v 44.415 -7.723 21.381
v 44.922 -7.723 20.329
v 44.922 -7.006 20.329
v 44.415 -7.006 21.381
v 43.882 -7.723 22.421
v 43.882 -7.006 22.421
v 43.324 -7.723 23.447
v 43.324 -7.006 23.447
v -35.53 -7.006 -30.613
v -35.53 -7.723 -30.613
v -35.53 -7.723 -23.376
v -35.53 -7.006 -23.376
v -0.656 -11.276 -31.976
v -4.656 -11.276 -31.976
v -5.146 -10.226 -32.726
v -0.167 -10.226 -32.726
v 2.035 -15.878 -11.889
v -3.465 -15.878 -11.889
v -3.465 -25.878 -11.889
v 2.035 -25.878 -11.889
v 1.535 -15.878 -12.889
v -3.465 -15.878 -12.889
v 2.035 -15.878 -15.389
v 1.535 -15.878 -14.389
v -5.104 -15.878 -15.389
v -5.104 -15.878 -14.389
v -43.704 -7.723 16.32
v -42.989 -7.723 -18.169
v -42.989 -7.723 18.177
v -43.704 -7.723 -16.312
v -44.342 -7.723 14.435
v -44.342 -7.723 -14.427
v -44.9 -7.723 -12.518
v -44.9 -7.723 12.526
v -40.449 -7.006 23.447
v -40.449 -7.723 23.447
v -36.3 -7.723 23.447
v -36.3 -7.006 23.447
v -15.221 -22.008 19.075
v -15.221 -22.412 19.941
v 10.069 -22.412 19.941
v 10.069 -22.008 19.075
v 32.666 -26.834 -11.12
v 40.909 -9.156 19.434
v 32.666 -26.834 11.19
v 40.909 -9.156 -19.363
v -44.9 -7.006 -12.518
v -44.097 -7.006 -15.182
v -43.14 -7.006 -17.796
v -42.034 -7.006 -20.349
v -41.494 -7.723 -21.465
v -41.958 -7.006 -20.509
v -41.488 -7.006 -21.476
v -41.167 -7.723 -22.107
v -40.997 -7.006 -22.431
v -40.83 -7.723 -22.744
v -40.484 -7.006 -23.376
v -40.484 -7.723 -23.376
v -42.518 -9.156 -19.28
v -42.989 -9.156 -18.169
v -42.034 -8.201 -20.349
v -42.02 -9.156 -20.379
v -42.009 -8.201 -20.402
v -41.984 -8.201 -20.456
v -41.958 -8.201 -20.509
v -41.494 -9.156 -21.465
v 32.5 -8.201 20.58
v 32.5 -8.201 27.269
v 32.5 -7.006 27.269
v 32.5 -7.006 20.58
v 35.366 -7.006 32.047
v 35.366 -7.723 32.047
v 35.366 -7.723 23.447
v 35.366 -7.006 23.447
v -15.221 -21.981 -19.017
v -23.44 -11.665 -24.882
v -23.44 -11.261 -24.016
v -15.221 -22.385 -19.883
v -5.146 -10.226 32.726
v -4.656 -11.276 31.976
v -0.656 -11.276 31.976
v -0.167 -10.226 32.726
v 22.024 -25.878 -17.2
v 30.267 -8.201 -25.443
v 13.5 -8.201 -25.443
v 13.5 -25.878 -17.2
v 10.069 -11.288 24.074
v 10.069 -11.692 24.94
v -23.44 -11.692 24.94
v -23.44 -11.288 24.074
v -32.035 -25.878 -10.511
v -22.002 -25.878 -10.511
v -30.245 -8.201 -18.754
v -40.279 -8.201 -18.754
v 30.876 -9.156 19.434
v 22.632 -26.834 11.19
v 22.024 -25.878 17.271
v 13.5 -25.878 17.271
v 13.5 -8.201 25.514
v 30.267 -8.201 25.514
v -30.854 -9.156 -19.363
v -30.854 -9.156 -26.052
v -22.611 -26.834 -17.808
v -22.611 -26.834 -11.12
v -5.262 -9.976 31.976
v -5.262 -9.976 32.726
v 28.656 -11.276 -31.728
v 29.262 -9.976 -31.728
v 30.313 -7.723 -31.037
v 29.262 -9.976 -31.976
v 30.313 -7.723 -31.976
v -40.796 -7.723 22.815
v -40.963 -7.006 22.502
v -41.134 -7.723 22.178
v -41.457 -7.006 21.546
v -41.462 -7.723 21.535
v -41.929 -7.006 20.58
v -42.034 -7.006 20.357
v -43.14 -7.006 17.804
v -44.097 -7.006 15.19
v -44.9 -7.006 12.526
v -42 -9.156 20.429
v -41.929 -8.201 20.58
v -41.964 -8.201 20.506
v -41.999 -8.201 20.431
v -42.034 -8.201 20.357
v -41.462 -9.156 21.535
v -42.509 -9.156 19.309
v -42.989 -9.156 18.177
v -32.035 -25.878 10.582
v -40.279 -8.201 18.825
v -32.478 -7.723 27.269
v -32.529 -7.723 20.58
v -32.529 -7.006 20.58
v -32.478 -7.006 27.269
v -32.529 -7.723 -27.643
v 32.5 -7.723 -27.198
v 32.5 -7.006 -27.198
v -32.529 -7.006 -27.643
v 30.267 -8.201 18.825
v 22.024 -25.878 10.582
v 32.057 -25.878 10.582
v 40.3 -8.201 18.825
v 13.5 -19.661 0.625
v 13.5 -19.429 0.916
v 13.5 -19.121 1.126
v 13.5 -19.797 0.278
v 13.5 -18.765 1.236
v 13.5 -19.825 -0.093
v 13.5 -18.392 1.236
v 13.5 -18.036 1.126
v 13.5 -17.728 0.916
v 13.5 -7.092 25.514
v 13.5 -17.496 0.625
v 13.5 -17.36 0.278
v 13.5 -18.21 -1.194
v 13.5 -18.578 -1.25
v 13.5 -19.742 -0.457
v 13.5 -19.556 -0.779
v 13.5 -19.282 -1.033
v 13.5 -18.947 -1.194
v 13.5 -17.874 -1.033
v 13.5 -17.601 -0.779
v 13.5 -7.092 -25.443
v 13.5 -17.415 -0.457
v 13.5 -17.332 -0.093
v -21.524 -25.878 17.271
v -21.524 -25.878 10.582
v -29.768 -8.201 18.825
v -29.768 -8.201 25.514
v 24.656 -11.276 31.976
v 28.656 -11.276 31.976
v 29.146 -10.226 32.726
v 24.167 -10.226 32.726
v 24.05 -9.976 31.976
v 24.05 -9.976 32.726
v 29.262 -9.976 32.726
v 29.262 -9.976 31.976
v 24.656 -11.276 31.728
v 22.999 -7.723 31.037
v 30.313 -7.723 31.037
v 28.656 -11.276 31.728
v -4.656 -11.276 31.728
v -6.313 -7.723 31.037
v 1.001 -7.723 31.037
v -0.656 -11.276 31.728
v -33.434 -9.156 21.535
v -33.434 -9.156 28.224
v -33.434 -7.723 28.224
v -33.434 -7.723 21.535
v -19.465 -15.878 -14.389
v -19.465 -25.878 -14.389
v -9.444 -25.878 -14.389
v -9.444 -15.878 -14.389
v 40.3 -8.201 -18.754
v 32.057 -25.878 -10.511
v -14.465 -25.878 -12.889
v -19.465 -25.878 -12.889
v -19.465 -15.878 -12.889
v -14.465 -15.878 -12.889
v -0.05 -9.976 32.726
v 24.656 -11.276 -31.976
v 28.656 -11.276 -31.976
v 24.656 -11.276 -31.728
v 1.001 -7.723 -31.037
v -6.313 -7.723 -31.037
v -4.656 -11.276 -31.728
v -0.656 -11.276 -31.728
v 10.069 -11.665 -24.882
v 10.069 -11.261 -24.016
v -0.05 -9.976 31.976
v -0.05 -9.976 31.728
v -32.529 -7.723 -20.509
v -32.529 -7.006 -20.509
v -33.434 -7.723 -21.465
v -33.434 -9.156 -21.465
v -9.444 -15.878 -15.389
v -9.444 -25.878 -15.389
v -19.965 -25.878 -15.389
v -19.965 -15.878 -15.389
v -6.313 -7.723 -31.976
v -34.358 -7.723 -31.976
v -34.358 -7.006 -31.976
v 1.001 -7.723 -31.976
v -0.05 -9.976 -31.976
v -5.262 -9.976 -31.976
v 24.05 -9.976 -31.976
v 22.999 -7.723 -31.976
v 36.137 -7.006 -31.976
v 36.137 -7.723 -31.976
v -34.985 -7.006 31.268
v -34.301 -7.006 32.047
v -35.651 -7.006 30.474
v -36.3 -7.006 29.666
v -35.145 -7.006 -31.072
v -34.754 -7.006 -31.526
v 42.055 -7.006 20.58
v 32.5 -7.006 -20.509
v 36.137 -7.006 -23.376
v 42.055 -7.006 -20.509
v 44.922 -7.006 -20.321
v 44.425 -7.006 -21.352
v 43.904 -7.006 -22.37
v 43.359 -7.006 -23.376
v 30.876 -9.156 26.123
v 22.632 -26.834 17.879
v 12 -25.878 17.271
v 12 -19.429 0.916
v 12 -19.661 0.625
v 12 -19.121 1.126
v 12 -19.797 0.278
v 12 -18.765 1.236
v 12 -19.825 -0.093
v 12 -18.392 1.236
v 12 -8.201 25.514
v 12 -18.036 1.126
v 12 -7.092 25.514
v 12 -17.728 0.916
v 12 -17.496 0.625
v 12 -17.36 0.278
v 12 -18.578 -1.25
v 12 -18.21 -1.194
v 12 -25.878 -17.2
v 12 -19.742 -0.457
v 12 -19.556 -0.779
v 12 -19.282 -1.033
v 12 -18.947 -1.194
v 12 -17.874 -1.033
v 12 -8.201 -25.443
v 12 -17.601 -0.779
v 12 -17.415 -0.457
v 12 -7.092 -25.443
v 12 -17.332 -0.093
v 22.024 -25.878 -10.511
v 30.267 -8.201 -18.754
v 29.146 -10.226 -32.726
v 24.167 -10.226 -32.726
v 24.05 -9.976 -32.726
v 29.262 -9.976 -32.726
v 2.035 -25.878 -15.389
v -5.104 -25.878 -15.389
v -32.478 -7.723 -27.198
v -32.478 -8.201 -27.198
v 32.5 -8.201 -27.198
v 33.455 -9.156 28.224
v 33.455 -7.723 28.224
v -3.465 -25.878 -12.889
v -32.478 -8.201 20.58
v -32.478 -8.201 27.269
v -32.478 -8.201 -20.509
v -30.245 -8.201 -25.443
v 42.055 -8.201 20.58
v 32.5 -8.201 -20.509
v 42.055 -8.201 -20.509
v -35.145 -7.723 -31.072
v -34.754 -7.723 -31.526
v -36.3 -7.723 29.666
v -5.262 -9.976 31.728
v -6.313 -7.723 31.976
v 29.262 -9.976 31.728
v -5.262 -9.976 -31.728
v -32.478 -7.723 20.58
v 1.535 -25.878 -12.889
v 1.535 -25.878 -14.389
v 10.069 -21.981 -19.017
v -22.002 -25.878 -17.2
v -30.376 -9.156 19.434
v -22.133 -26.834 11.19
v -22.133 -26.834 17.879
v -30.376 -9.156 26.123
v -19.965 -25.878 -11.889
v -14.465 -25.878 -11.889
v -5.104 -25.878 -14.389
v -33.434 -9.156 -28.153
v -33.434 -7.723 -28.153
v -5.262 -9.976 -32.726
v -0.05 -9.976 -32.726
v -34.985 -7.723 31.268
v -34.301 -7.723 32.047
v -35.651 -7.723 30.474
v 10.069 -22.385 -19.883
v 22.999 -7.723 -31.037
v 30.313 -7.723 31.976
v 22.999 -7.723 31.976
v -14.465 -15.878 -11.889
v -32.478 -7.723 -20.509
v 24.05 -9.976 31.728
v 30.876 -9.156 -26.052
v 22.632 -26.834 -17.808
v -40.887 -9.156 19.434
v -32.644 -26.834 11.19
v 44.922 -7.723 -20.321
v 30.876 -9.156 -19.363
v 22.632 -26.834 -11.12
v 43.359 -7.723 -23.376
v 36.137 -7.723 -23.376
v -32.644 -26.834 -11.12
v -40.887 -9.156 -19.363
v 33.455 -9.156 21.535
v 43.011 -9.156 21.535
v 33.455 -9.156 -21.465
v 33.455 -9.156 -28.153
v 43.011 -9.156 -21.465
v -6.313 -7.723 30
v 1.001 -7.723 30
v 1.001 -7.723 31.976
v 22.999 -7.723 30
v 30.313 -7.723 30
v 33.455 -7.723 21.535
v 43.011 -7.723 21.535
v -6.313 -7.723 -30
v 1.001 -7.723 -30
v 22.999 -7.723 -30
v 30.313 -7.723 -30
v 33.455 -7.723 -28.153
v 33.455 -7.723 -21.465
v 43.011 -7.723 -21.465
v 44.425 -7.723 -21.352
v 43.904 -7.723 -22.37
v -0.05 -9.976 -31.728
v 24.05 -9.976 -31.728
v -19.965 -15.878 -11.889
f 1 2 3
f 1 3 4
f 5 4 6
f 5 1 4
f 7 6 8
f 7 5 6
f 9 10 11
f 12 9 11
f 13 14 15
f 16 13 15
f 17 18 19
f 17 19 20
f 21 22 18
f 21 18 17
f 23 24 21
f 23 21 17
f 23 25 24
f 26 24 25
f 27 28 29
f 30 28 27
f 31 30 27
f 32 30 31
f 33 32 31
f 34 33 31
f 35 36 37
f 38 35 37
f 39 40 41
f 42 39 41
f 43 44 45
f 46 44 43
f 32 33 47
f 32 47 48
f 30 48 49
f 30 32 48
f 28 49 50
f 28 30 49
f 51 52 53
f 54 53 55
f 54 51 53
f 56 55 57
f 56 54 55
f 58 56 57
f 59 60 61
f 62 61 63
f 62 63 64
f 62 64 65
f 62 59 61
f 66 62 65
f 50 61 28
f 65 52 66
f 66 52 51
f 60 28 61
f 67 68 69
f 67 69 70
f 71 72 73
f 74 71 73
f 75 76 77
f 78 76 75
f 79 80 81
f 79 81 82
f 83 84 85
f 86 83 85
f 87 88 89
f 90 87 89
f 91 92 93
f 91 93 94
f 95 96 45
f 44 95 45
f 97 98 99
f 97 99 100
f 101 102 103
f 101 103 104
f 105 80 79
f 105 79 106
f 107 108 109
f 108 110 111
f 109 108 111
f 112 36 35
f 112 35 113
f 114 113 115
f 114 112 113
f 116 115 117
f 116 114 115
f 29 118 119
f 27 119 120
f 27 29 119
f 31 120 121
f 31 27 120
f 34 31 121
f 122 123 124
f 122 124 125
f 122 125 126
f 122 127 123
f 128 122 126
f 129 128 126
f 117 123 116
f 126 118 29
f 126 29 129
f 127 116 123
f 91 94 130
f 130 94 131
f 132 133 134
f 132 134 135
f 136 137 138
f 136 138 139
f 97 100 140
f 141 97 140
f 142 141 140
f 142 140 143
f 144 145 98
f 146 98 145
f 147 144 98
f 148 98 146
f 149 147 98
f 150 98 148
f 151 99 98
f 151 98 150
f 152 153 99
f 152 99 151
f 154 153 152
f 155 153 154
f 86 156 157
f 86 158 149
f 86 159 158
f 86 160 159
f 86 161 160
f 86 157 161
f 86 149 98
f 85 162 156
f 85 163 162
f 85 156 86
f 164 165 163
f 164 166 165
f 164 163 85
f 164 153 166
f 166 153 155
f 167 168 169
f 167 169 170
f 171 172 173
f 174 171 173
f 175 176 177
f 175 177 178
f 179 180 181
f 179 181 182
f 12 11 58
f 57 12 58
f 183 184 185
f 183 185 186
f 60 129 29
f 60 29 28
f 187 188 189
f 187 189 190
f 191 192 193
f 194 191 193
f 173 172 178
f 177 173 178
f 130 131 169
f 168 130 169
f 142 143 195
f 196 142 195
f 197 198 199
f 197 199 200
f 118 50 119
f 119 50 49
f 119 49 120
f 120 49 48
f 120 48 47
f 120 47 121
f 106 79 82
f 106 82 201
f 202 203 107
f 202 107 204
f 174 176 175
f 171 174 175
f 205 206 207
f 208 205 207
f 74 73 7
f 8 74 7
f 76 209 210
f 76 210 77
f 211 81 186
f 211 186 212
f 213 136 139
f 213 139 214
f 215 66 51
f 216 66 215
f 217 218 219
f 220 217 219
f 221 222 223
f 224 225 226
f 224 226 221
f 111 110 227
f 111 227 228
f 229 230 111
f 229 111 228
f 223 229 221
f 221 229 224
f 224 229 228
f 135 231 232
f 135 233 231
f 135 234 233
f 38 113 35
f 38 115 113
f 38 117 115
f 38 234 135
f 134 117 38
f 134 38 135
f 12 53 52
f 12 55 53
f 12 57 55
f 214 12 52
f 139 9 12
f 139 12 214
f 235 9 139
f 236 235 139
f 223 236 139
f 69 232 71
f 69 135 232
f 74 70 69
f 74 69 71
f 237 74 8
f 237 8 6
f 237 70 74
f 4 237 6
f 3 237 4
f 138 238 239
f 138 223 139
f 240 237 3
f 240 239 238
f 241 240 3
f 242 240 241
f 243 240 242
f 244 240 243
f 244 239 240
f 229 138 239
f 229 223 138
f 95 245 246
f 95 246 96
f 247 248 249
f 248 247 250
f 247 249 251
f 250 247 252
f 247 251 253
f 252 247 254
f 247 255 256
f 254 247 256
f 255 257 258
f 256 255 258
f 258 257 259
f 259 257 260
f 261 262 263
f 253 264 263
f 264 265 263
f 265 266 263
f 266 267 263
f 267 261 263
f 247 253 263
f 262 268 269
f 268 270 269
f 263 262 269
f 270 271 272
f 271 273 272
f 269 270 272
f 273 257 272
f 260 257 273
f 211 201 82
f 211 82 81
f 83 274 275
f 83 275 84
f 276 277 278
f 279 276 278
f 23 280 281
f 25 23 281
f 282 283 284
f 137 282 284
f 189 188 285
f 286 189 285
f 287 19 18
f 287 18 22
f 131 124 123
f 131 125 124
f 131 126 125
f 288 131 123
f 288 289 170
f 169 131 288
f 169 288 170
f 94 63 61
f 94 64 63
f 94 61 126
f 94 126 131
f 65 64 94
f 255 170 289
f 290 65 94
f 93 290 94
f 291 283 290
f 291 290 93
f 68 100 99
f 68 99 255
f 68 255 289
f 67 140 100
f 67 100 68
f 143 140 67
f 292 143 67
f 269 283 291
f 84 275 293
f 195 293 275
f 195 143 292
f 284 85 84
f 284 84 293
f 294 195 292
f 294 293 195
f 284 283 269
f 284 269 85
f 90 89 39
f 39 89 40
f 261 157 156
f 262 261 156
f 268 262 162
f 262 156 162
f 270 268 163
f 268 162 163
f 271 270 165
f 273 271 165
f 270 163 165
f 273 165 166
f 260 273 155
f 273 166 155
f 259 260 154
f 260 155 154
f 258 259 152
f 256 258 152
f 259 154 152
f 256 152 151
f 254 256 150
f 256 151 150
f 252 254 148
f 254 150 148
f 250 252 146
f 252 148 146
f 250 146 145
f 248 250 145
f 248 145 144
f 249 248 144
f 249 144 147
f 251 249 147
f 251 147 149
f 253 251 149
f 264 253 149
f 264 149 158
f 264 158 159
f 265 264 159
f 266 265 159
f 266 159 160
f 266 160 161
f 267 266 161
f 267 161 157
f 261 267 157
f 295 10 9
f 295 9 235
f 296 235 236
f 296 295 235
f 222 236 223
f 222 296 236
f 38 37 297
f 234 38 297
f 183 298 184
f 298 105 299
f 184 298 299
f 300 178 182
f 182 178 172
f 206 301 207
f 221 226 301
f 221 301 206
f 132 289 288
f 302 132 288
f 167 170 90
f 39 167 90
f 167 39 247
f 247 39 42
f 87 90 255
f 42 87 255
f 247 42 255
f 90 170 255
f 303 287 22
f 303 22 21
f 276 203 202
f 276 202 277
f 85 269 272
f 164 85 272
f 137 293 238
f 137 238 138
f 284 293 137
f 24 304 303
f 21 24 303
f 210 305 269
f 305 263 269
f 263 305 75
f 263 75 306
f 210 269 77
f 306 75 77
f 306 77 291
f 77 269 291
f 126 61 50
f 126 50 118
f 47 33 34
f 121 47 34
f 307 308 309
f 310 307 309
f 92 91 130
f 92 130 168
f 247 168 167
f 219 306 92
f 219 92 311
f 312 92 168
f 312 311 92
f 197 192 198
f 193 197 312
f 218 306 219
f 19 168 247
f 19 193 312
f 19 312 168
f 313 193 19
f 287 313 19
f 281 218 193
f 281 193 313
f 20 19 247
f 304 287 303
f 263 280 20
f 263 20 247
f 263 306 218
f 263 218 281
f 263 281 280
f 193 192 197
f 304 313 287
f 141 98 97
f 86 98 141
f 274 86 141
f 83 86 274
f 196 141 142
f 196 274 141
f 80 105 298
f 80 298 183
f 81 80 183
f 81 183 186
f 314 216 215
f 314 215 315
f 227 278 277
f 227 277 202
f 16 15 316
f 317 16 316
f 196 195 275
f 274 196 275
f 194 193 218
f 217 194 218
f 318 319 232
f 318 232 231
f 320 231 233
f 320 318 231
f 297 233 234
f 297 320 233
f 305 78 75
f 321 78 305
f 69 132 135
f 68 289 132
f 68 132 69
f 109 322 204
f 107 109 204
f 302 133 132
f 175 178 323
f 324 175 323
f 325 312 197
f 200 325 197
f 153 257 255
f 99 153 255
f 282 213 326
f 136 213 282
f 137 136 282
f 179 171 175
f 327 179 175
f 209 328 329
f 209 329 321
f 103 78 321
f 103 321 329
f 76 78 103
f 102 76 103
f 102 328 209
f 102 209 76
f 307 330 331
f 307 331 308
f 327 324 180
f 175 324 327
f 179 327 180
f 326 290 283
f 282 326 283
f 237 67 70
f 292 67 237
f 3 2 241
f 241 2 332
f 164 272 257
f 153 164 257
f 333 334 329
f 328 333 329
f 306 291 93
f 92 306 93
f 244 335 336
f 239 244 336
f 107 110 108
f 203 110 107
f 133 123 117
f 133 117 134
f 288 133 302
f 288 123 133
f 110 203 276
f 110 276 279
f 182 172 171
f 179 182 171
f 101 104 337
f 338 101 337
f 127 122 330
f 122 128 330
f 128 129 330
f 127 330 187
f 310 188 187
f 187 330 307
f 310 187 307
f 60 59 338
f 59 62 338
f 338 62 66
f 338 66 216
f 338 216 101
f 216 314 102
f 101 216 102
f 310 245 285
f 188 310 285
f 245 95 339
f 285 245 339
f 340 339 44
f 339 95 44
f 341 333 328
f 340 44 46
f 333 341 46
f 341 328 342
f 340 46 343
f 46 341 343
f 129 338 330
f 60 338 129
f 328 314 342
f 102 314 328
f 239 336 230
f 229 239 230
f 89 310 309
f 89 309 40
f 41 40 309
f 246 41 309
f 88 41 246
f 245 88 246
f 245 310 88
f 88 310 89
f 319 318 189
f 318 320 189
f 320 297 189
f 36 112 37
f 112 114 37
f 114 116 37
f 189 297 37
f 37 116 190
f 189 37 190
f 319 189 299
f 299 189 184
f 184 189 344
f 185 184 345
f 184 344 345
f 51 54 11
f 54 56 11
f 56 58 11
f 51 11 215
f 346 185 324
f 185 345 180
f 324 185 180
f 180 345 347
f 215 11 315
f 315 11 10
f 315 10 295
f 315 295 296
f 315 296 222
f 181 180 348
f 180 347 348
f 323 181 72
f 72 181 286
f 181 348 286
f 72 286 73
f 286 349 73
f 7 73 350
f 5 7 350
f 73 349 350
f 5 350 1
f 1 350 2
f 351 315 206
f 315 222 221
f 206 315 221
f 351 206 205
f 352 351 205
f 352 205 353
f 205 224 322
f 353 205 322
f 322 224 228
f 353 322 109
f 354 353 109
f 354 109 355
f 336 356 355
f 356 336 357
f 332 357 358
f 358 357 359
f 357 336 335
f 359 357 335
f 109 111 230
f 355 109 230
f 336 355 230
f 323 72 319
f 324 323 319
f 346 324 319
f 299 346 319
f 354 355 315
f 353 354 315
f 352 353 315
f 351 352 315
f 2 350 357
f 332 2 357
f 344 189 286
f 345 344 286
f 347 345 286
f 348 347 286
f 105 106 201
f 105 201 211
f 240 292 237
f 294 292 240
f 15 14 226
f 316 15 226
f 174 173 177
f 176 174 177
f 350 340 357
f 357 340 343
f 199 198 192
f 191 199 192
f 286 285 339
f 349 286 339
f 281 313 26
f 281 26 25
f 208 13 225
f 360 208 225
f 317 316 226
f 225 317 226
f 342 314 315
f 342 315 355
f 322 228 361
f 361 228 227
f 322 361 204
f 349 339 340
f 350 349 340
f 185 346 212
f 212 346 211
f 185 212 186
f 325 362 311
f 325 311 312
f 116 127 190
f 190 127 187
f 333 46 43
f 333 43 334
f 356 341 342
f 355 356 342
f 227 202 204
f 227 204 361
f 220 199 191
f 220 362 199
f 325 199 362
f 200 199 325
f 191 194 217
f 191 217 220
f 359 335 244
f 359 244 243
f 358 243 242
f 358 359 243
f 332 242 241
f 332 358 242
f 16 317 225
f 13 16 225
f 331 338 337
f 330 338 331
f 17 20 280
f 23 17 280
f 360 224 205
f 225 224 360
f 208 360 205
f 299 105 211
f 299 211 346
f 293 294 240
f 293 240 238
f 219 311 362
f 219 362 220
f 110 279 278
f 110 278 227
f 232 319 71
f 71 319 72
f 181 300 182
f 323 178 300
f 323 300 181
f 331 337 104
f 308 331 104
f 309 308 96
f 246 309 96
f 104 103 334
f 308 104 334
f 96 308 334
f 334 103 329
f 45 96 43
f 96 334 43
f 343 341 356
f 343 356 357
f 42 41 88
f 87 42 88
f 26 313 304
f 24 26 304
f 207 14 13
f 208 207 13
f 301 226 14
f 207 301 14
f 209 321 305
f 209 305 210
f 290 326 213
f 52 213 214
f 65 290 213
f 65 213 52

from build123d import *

# Parameters (mm, degrees)
SKETCH1_W             = 140
SKETCH1_H             = 14
SKETCH1_W_2           = 180
SKETCH1_H_2           = 90
BOSS_EXTRUDE1_DEPTH   = 3
BOSS_EXTRUDE2_DEPTH   = 40
BOSS_EXTRUDE2_DRAFT   = -25
SHELL1_T              = -2
BOSS_EXTRUDE4_DEPTH   = 1.5
SCALE1_SCALE          = 0.4777778
CUT_EXTRUDE3_START    = -10
CUT_EXTRUDE3_DEPTH    = 4
SNAP_START            = -31.975695848
SNAP_HOOK1_DEPTH      = 0.247222222
SNAP_START_2          = -6.313244992
SNAP_HOOK1_2_DEPTH    = 7.314130886
SNAP_START_3          = -5.262379505
SNAP_HOOK1_3_DEPTH    = 5.212399912
SNAP_START_4          = -34
SNAP_HOOK1_4_DEPTH    = 4
SKETCH16_W            = 5
SKETCH16_H            = 1
SKETCH16_W_2          = 0.5
SKETCH16_H_2          = 3.5
SKETCH16_W_3          = 10.020724484
SKETCH16_W_4          = 6.639207239
BOSS_EXTRUDE5_DEPTH   = 10
CUT_EXTRUDE8_DEPTH    = 3.5
BOSS_EXTRUDE9_DEPTH   = 1.5
MIRROR34_START        = -31.975695848
MIRROR34_COPY_1_DEPTH = 0.247222222
MIRROR34_START_2      = -6.313244992
MIRROR34_COPY_2_DEPTH = 7.314130886
MIRROR34_START_3      = -5.262379505
MIRROR34_COPY_3_DEPTH = 5.212399912
MIRROR34_START_4      = -34
MIRROR34_COPY_4_DEPTH = 4
MIRROR34_COPY_5_DEPTH = 7.314130886
MIRROR34_COPY_6_DEPTH = 5.212399912
MIRROR34_COPY_7_DEPTH = 4
SKETCH32_R            = 1.25
CUT_EXTRUDE9_DEPTH    = 3


with BuildPart() as part:
    # Sketch1 → Boss-Extrude1 (new body)
    with BuildSketch(Plane(origin=(0, 0, 0), x_dir=(1, 0, 0), z_dir=(0, 1, 0))):
        with Locations((0, -52)):
            Rectangle(SKETCH1_W, SKETCH1_H)
        Rectangle(SKETCH1_W_2, SKETCH1_H_2)
        with Locations((0, 52)):
            Rectangle(SKETCH1_W, SKETCH1_H)
    extrude(amount=BOSS_EXTRUDE1_DEPTH)


with BuildPart() as boss_extrude2_tool:
    # Sketch2 → Boss-Extrude2 (with draft: the straight prism first)
    with BuildSketch(Plane(origin=(0, 3, 0), x_dir=(1, 0, 0), z_dir=(0, 1, 0))):
        Polygon((87, -42), (87, 42), (66, 42), (66, 56), (-66, 56), (-66, 42), (-87, 42), (-87, -42), (-65, -42), (-65, -56), (66, -56), (66, -42), align=None)
    extrude(amount=-BOSS_EXTRUDE2_DEPTH)
    # Boss-Extrude2: the draft: its side faces are tilted about the plane it starts from
    boss_extrude2_sides = [boss_extrude2_tool.faces().sort_by_distance(p)[0] for p in [
        (87, -17, 0),
        (76.5, -17, -42),
        (66, -17, -49),
        (0, -17, -56),
        (-66, -17, -49),
        (-76.5, -17, -42),
        (-87, -17, 0),
        (-76, -17, 42),
        (-65, -17, 49),
        (0.5, -17, 56),
        (66, -17, 49),
        (76.5, -17, 42),
    ]]
    draft(boss_extrude2_sides, Plane(origin=(0, 3, 0), x_dir=(1, 0, 0), z_dir=(0, 1, 0)), BOSS_EXTRUDE2_DRAFT)


with BuildPart() as part_1:
    add(part.part)

    # Boss-Extrude2: add boss_extrude2_tool
    add(boss_extrude2_tool.part)

    # Shell1
    shell1_openings = [part_1.faces().sort_by_distance(p)[0] for p in [
        (0, 3, 0),
    ]]
    offset(amount=SHELL1_T, openings=shell1_openings, kind=Kind.INTERSECTION)

    # Sketch6 → Boss-Extrude4 (add)
    with BuildSketch(Plane(origin=(0, 3, 0), x_dir=(1, 0, 0), z_dir=(0, 1, 0))):
        Polygon((94, 49), (75.612106054, 49), (75.612106054, 67), (-74.387893946, 67), (-74.387893946, 49), (-94, 49), (-94, -49), (-76, -49), (-76, -67), (74, -67), (74, -49), (94, -49), align=None)
        Polygon((88, -43), (88, 43), (68, 43), (68, 57), (-68.106730885, 57.932601668), (-68.106730885, 43), (-88, 43), (-88, -43), (-68.106730885, -43), (-68, -57), (68, -57), (68, -43), align=None, mode=Mode.SUBTRACT)
    extrude(amount=BOSS_EXTRUDE4_DEPTH)


with BuildPart() as part_2:
    # Scale1: scaled about (0.020709859, -17.532954153, 0.067819315)
    add(part_1.part.scale(SCALE1_SCALE).moved(Location((0.010815148, -9.15609789, 0.035416752))))

    # Cut-Extrude3: read off the stored shape, not the designer's step
    # Cut-Extrude3 outline → Cut-Extrude3 (cut)
    with BuildSketch(Plane(origin=(0, 0, 0), x_dir=(1, 0, 0), z_dir=(0, 1, 0)).offset(CUT_EXTRUDE3_START)):
        with BuildLine():
            ThreePointArc((-34.301389296, -32.046529352), (-35.32011541, -30.872581639), (-36.300297652, -29.666265387))
            Line((-36.300297652, -29.666265387), (-36.300297652, -32.046529352))
            Line((-36.300297652, -32.046529352), (-34.301389296, -32.046529352))
        make_face()
        with BuildLine():
            Line((-40.483605991, 23.375695448), (-44.900298052, 23.375695448))
            Line((-44.900298052, 23.375695448), (-44.900298052, 12.517856629))
            ThreePointArc((-44.900298052, 12.517856629), (-43.024636929, 18.082103779), (-40.483605991, 23.375695448))
        make_face()
        with BuildLine():
            Line((-35.530069168, 31.975695848), (-35.530069168, 30.612812124))
            ThreePointArc((-35.530069168, 30.612812124), (-34.950219267, 31.299743697), (-34.35760676, 31.975695848))
            Line((-34.35760676, 31.975695848), (-35.530069168, 31.975695848))
        make_face()
        with BuildLine():
            Line((-44.900298052, -12.525876421), (-44.900298052, -23.446528952))
            Line((-44.900298052, -23.446528952), (-40.448512682, -23.446528952))
            ThreePointArc((-40.448512682, -23.446528952), (-43.011068882, -18.123442994), (-44.900298052, -12.525876421))
        make_face()
        with BuildLine():
            Line((44.921928348, -23.446528952), (44.921928348, -20.329243571))
            ThreePointArc((44.921928348, -20.329243571), (44.151290065, -21.90247063), (43.3237572, -23.446528952))
            Line((43.3237572, -23.446528952), (44.921928348, -23.446528952))
        make_face()
        with BuildLine():
            ThreePointArc((43.35885051, 23.375695448), (44.167690984, 21.862430755), (44.921928348, 20.321223779))
            Line((44.921928348, 20.321223779), (44.921928348, 23.375695448))
            Line((44.921928348, 23.375695448), (43.35885051, 23.375695448))
        make_face()
    extrude(amount=CUT_EXTRUDE3_DEPTH, mode=Mode.SUBTRACT)



with BuildPart() as body_2:
    # Snap Hook1: read off the stored shape, not the designer's step
    # Snap Hook1 outline → Snap Hook1 (new body)
    with BuildSketch(Plane.XY.offset(SNAP_START)):
        Polygon((-5.262379505, -9.9763528), (-4.656179549, -11.2763528), (-0.656179549, -11.2763528), (-0.049979593, -9.9763528), align=None)
    snap_hook1 = extrude(amount=SNAP_HOOK1_DEPTH)


with BuildPart() as part_3:
    add(part_2.part)

    add(body_2.part)  # Snap Hook1 2 merges body 2
    # Snap Hook1 2 outline → Snap Hook1 2 (add)
    with BuildSketch(Plane.YZ.offset(SNAP_START_2)):
        Polygon((-9.9763528, -31.975695848), (-7.72276449, -31.975695848), (-7.72276449, -31.037498121), (-11.2763528, -31.728473626), (-9.9763528, -31.728473626), align=None)
    snap_hook1_2 = extrude(amount=SNAP_HOOK1_2_DEPTH)

    # Snap Hook1 3 outline → Snap Hook1 3 (add)
    with BuildSketch(Plane.YZ.offset(SNAP_START_3)):
        Polygon((-9.9763528, -32.725695848), (-9.9763528, -31.975695848), (-11.2763528, -31.975695848), (-10.2263528, -32.725695848), align=None)
    snap_hook1_3 = extrude(amount=SNAP_HOOK1_3_DEPTH)

    # Snap Hook1 4 outline → Snap Hook1 4 (cut)
    with BuildSketch(Plane.XY.offset(SNAP_START_4)):
        Polygon((-6.313244992, -7.72276449), (-6.313244992, -13), (-3.85242966, -13), (-4.656179549, -11.2763528), align=None)
        Polygon((-0.656179549, -11.2763528), (-1.459929438, -13), (1.000885894, -13), (1.000885894, -7.72276449), align=None)
    snap_hook1_4 = extrude(amount=SNAP_HOOK1_4_DEPTH, mode=Mode.SUBTRACT)

    # Sketch16 → Boss-Extrude5 (add)
    with BuildSketch(Plane(origin=(0, -25.87832089, 0), x_dir=(1, 0, 0), z_dir=(0, 1, 0))):
        with Locations((-16.965194138, 12.3890301)):
            Rectangle(SKETCH16_W, SKETCH16_H)
        with Locations((-19.715194138, 13.6390301)):
            Rectangle(SKETCH16_W_2, SKETCH16_H_2)
        with Locations((-14.454831896, 14.8890301)):
            Rectangle(SKETCH16_W_3, SKETCH16_H)
        with Locations((-0.965194138, 12.3890301)):
            Rectangle(SKETCH16_W, SKETCH16_H)
        with Locations((-1.784797758, 14.8890301)):
            Rectangle(SKETCH16_W_4, SKETCH16_H)
        Polygon((2.034805862, 15.3890301), (1.534805862, 15.3890301), (1.534805862, 14.3890301), (1.534805862, 12.8890301), (1.534805862, 11.8890301), (2.034805862, 11.8890301), align=None)
    extrude(amount=BOSS_EXTRUDE5_DEPTH)

    # Mirror17: Snap Hook1, Snap Hook1 2, Snap Hook1 3, Snap Hook1 4 across plane
    add(snap_hook1.mirror(Plane.XY))
    add(snap_hook1_2.mirror(Plane.XY))
    add(snap_hook1_3.mirror(Plane.XY))
    add(snap_hook1_4.mirror(Plane.XY), mode=Mode.SUBTRACT)

    # Sketch28 → Cut-Extrude8 (cut, symmetric)
    with BuildSketch(Plane(origin=(0, -11.613740983, -24.905747912), x_dir=(-1, 0, 0), z_dir=(0, -0.42261826174070033, -0.9063077870366497))):
        Polygon((23.440057223, -0.056353665), (15.221105561, -11.884805387), (-10.068654735, -11.884805387), (-10.068654735, -0.056353665), align=None)
    cut_extrude8 = extrude(amount=CUT_EXTRUDE8_DEPTH, both=True, mode=Mode.SUBTRACT)

    # Mirror33: Cut-Extrude8 across plane
    add(cut_extrude8.mirror(Plane.XY), mode=Mode.SUBTRACT)

    # Sketch31 → Boss-Extrude9 (add)
    with BuildSketch(Plane(origin=(12, 0, 0), x_dir=(0, 0, -1), z_dir=(1, 0, 0))):
        Polygon((-25.513843155, -8.20054229), (-17.270559615, -25.87832089), (17.199726111, -25.87832089), (25.443009652, -8.20054229), (25.443009652, -7.091787122), (-25.513843155, -7.091787122), align=None)
    extrude(amount=BOSS_EXTRUDE9_DEPTH)

    # Mirror34: Snap Hook1, Snap Hook1 2, Snap Hook1 3, Snap Hook1 4 across plane
    add(snap_hook1.mirror(Plane(origin=(12, 0, 0), x_dir=(0, 0, 1), z_dir=(1, 0, 0))))
    add(snap_hook1_2.mirror(Plane(origin=(12, 0, 0), x_dir=(0, 0, 1), z_dir=(1, 0, 0))))
    add(snap_hook1_3.mirror(Plane(origin=(12, 0, 0), x_dir=(0, 0, 1), z_dir=(1, 0, 0))))
    add(snap_hook1_4.mirror(Plane(origin=(12, 0, 0), x_dir=(0, 0, 1), z_dir=(1, 0, 0))), mode=Mode.SUBTRACT)



with BuildPart() as body_2_2:
    # Mirror34 copy 1 sketch → Mirror34 copy 1 (new body)
    with BuildSketch(Plane(origin=(24, 0, 0), x_dir=(-1, 0, 0), z_dir=(0, 0, -1)).offset(MIRROR34_START)):
        Polygon((-5.262379505, -9.9763528), (-4.656179549, -11.2763528), (-0.656179549, -11.2763528), (-0.049979593, -9.9763528), align=None)
    extrude(amount=MIRROR34_COPY_1_DEPTH)


with BuildPart() as part_4:
    add(part_3.part)

    add(body_2_2.part)  # Mirror34 copy 2 merges body 2 2
    # Mirror34 copy 2 sketch → Mirror34 copy 2 (add)
    with BuildSketch(Plane(origin=(24, 0, 0), x_dir=(0, 1, 0), z_dir=(-1, 0, 0)).offset(MIRROR34_START_2)):
        Polygon((-9.9763528, -31.975695848), (-7.72276449, -31.975695848), (-7.72276449, -31.037498121), (-11.2763528, -31.728473626), (-9.9763528, -31.728473626), align=None)
    extrude(amount=MIRROR34_COPY_2_DEPTH)

    # Mirror34 copy 3 sketch → Mirror34 copy 3 (add)
    with BuildSketch(Plane(origin=(24, 0, 0), x_dir=(0, 1, 0), z_dir=(-1, 0, 0)).offset(MIRROR34_START_3)):
        Polygon((-9.9763528, -32.725695848), (-9.9763528, -31.975695848), (-11.2763528, -31.975695848), (-10.2263528, -32.725695848), align=None)
    extrude(amount=MIRROR34_COPY_3_DEPTH)

    # Mirror34 copy 4 sketch → Mirror34 copy 4 (cut)
    with BuildSketch(Plane(origin=(24, 0, 0), x_dir=(-1, 0, 0), z_dir=(0, 0, -1)).offset(MIRROR34_START_4)):
        Polygon((-6.313244992, -7.72276449), (-6.313244992, -13), (-3.85242966, -13), (-4.656179549, -11.2763528), align=None)
        Polygon((-0.656179549, -11.2763528), (-1.459929438, -13), (1.000885894, -13), (1.000885894, -7.72276449), align=None)
    extrude(amount=MIRROR34_COPY_4_DEPTH, mode=Mode.SUBTRACT)

    # Mirror34 copy 5 sketch → Mirror34 copy 5 (add)
    with BuildSketch(Plane(origin=(24, 0, 0), x_dir=(0, 1, 0), z_dir=(-1, 0, 0)).offset(MIRROR34_START_2)):
        Polygon((-9.9763528, 31.975695848), (-7.72276449, 31.975695848), (-7.72276449, 31.037498121), (-11.2763528, 31.728473626), (-9.9763528, 31.728473626), align=None)
    extrude(amount=MIRROR34_COPY_5_DEPTH)

    # Mirror34 copy 6 sketch → Mirror34 copy 6 (add)
    with BuildSketch(Plane(origin=(24, 0, 0), x_dir=(0, 1, 0), z_dir=(-1, 0, 0)).offset(MIRROR34_START_3)):
        Polygon((-9.9763528, 32.725695848), (-9.9763528, 31.975695848), (-11.2763528, 31.975695848), (-10.2263528, 32.725695848), align=None)
    extrude(amount=MIRROR34_COPY_6_DEPTH)

    # Mirror34 copy 7 sketch → Mirror34 copy 7 (cut)
    with BuildSketch(Plane(origin=(24, 0, 0), x_dir=(-1, 0, 0), z_dir=(0, 0, 1)).offset(MIRROR34_START_4)):
        Polygon((-6.313244992, 7.72276449), (-6.313244992, 13), (-3.85242966, 13), (-4.656179549, 11.2763528), align=None)
        Polygon((-0.656179549, 11.2763528), (-1.459929438, 13), (1.000885894, 13), (1.000885894, 7.72276449), align=None)
    extrude(amount=MIRROR34_COPY_7_DEPTH, mode=Mode.SUBTRACT)

    # Sketch32 → Cut-Extrude9 (cut)
    with BuildSketch(Plane(origin=(13.5, 0, 0), x_dir=(0, 0, -1), z_dir=(1, 0, 0))):
        with Locations((0, -18.57832089)):
            Circle(SKETCH32_R)
    extrude(amount=-CUT_EXTRUDE9_DEPTH, mode=Mode.SUBTRACT)


solid = part_4.part
